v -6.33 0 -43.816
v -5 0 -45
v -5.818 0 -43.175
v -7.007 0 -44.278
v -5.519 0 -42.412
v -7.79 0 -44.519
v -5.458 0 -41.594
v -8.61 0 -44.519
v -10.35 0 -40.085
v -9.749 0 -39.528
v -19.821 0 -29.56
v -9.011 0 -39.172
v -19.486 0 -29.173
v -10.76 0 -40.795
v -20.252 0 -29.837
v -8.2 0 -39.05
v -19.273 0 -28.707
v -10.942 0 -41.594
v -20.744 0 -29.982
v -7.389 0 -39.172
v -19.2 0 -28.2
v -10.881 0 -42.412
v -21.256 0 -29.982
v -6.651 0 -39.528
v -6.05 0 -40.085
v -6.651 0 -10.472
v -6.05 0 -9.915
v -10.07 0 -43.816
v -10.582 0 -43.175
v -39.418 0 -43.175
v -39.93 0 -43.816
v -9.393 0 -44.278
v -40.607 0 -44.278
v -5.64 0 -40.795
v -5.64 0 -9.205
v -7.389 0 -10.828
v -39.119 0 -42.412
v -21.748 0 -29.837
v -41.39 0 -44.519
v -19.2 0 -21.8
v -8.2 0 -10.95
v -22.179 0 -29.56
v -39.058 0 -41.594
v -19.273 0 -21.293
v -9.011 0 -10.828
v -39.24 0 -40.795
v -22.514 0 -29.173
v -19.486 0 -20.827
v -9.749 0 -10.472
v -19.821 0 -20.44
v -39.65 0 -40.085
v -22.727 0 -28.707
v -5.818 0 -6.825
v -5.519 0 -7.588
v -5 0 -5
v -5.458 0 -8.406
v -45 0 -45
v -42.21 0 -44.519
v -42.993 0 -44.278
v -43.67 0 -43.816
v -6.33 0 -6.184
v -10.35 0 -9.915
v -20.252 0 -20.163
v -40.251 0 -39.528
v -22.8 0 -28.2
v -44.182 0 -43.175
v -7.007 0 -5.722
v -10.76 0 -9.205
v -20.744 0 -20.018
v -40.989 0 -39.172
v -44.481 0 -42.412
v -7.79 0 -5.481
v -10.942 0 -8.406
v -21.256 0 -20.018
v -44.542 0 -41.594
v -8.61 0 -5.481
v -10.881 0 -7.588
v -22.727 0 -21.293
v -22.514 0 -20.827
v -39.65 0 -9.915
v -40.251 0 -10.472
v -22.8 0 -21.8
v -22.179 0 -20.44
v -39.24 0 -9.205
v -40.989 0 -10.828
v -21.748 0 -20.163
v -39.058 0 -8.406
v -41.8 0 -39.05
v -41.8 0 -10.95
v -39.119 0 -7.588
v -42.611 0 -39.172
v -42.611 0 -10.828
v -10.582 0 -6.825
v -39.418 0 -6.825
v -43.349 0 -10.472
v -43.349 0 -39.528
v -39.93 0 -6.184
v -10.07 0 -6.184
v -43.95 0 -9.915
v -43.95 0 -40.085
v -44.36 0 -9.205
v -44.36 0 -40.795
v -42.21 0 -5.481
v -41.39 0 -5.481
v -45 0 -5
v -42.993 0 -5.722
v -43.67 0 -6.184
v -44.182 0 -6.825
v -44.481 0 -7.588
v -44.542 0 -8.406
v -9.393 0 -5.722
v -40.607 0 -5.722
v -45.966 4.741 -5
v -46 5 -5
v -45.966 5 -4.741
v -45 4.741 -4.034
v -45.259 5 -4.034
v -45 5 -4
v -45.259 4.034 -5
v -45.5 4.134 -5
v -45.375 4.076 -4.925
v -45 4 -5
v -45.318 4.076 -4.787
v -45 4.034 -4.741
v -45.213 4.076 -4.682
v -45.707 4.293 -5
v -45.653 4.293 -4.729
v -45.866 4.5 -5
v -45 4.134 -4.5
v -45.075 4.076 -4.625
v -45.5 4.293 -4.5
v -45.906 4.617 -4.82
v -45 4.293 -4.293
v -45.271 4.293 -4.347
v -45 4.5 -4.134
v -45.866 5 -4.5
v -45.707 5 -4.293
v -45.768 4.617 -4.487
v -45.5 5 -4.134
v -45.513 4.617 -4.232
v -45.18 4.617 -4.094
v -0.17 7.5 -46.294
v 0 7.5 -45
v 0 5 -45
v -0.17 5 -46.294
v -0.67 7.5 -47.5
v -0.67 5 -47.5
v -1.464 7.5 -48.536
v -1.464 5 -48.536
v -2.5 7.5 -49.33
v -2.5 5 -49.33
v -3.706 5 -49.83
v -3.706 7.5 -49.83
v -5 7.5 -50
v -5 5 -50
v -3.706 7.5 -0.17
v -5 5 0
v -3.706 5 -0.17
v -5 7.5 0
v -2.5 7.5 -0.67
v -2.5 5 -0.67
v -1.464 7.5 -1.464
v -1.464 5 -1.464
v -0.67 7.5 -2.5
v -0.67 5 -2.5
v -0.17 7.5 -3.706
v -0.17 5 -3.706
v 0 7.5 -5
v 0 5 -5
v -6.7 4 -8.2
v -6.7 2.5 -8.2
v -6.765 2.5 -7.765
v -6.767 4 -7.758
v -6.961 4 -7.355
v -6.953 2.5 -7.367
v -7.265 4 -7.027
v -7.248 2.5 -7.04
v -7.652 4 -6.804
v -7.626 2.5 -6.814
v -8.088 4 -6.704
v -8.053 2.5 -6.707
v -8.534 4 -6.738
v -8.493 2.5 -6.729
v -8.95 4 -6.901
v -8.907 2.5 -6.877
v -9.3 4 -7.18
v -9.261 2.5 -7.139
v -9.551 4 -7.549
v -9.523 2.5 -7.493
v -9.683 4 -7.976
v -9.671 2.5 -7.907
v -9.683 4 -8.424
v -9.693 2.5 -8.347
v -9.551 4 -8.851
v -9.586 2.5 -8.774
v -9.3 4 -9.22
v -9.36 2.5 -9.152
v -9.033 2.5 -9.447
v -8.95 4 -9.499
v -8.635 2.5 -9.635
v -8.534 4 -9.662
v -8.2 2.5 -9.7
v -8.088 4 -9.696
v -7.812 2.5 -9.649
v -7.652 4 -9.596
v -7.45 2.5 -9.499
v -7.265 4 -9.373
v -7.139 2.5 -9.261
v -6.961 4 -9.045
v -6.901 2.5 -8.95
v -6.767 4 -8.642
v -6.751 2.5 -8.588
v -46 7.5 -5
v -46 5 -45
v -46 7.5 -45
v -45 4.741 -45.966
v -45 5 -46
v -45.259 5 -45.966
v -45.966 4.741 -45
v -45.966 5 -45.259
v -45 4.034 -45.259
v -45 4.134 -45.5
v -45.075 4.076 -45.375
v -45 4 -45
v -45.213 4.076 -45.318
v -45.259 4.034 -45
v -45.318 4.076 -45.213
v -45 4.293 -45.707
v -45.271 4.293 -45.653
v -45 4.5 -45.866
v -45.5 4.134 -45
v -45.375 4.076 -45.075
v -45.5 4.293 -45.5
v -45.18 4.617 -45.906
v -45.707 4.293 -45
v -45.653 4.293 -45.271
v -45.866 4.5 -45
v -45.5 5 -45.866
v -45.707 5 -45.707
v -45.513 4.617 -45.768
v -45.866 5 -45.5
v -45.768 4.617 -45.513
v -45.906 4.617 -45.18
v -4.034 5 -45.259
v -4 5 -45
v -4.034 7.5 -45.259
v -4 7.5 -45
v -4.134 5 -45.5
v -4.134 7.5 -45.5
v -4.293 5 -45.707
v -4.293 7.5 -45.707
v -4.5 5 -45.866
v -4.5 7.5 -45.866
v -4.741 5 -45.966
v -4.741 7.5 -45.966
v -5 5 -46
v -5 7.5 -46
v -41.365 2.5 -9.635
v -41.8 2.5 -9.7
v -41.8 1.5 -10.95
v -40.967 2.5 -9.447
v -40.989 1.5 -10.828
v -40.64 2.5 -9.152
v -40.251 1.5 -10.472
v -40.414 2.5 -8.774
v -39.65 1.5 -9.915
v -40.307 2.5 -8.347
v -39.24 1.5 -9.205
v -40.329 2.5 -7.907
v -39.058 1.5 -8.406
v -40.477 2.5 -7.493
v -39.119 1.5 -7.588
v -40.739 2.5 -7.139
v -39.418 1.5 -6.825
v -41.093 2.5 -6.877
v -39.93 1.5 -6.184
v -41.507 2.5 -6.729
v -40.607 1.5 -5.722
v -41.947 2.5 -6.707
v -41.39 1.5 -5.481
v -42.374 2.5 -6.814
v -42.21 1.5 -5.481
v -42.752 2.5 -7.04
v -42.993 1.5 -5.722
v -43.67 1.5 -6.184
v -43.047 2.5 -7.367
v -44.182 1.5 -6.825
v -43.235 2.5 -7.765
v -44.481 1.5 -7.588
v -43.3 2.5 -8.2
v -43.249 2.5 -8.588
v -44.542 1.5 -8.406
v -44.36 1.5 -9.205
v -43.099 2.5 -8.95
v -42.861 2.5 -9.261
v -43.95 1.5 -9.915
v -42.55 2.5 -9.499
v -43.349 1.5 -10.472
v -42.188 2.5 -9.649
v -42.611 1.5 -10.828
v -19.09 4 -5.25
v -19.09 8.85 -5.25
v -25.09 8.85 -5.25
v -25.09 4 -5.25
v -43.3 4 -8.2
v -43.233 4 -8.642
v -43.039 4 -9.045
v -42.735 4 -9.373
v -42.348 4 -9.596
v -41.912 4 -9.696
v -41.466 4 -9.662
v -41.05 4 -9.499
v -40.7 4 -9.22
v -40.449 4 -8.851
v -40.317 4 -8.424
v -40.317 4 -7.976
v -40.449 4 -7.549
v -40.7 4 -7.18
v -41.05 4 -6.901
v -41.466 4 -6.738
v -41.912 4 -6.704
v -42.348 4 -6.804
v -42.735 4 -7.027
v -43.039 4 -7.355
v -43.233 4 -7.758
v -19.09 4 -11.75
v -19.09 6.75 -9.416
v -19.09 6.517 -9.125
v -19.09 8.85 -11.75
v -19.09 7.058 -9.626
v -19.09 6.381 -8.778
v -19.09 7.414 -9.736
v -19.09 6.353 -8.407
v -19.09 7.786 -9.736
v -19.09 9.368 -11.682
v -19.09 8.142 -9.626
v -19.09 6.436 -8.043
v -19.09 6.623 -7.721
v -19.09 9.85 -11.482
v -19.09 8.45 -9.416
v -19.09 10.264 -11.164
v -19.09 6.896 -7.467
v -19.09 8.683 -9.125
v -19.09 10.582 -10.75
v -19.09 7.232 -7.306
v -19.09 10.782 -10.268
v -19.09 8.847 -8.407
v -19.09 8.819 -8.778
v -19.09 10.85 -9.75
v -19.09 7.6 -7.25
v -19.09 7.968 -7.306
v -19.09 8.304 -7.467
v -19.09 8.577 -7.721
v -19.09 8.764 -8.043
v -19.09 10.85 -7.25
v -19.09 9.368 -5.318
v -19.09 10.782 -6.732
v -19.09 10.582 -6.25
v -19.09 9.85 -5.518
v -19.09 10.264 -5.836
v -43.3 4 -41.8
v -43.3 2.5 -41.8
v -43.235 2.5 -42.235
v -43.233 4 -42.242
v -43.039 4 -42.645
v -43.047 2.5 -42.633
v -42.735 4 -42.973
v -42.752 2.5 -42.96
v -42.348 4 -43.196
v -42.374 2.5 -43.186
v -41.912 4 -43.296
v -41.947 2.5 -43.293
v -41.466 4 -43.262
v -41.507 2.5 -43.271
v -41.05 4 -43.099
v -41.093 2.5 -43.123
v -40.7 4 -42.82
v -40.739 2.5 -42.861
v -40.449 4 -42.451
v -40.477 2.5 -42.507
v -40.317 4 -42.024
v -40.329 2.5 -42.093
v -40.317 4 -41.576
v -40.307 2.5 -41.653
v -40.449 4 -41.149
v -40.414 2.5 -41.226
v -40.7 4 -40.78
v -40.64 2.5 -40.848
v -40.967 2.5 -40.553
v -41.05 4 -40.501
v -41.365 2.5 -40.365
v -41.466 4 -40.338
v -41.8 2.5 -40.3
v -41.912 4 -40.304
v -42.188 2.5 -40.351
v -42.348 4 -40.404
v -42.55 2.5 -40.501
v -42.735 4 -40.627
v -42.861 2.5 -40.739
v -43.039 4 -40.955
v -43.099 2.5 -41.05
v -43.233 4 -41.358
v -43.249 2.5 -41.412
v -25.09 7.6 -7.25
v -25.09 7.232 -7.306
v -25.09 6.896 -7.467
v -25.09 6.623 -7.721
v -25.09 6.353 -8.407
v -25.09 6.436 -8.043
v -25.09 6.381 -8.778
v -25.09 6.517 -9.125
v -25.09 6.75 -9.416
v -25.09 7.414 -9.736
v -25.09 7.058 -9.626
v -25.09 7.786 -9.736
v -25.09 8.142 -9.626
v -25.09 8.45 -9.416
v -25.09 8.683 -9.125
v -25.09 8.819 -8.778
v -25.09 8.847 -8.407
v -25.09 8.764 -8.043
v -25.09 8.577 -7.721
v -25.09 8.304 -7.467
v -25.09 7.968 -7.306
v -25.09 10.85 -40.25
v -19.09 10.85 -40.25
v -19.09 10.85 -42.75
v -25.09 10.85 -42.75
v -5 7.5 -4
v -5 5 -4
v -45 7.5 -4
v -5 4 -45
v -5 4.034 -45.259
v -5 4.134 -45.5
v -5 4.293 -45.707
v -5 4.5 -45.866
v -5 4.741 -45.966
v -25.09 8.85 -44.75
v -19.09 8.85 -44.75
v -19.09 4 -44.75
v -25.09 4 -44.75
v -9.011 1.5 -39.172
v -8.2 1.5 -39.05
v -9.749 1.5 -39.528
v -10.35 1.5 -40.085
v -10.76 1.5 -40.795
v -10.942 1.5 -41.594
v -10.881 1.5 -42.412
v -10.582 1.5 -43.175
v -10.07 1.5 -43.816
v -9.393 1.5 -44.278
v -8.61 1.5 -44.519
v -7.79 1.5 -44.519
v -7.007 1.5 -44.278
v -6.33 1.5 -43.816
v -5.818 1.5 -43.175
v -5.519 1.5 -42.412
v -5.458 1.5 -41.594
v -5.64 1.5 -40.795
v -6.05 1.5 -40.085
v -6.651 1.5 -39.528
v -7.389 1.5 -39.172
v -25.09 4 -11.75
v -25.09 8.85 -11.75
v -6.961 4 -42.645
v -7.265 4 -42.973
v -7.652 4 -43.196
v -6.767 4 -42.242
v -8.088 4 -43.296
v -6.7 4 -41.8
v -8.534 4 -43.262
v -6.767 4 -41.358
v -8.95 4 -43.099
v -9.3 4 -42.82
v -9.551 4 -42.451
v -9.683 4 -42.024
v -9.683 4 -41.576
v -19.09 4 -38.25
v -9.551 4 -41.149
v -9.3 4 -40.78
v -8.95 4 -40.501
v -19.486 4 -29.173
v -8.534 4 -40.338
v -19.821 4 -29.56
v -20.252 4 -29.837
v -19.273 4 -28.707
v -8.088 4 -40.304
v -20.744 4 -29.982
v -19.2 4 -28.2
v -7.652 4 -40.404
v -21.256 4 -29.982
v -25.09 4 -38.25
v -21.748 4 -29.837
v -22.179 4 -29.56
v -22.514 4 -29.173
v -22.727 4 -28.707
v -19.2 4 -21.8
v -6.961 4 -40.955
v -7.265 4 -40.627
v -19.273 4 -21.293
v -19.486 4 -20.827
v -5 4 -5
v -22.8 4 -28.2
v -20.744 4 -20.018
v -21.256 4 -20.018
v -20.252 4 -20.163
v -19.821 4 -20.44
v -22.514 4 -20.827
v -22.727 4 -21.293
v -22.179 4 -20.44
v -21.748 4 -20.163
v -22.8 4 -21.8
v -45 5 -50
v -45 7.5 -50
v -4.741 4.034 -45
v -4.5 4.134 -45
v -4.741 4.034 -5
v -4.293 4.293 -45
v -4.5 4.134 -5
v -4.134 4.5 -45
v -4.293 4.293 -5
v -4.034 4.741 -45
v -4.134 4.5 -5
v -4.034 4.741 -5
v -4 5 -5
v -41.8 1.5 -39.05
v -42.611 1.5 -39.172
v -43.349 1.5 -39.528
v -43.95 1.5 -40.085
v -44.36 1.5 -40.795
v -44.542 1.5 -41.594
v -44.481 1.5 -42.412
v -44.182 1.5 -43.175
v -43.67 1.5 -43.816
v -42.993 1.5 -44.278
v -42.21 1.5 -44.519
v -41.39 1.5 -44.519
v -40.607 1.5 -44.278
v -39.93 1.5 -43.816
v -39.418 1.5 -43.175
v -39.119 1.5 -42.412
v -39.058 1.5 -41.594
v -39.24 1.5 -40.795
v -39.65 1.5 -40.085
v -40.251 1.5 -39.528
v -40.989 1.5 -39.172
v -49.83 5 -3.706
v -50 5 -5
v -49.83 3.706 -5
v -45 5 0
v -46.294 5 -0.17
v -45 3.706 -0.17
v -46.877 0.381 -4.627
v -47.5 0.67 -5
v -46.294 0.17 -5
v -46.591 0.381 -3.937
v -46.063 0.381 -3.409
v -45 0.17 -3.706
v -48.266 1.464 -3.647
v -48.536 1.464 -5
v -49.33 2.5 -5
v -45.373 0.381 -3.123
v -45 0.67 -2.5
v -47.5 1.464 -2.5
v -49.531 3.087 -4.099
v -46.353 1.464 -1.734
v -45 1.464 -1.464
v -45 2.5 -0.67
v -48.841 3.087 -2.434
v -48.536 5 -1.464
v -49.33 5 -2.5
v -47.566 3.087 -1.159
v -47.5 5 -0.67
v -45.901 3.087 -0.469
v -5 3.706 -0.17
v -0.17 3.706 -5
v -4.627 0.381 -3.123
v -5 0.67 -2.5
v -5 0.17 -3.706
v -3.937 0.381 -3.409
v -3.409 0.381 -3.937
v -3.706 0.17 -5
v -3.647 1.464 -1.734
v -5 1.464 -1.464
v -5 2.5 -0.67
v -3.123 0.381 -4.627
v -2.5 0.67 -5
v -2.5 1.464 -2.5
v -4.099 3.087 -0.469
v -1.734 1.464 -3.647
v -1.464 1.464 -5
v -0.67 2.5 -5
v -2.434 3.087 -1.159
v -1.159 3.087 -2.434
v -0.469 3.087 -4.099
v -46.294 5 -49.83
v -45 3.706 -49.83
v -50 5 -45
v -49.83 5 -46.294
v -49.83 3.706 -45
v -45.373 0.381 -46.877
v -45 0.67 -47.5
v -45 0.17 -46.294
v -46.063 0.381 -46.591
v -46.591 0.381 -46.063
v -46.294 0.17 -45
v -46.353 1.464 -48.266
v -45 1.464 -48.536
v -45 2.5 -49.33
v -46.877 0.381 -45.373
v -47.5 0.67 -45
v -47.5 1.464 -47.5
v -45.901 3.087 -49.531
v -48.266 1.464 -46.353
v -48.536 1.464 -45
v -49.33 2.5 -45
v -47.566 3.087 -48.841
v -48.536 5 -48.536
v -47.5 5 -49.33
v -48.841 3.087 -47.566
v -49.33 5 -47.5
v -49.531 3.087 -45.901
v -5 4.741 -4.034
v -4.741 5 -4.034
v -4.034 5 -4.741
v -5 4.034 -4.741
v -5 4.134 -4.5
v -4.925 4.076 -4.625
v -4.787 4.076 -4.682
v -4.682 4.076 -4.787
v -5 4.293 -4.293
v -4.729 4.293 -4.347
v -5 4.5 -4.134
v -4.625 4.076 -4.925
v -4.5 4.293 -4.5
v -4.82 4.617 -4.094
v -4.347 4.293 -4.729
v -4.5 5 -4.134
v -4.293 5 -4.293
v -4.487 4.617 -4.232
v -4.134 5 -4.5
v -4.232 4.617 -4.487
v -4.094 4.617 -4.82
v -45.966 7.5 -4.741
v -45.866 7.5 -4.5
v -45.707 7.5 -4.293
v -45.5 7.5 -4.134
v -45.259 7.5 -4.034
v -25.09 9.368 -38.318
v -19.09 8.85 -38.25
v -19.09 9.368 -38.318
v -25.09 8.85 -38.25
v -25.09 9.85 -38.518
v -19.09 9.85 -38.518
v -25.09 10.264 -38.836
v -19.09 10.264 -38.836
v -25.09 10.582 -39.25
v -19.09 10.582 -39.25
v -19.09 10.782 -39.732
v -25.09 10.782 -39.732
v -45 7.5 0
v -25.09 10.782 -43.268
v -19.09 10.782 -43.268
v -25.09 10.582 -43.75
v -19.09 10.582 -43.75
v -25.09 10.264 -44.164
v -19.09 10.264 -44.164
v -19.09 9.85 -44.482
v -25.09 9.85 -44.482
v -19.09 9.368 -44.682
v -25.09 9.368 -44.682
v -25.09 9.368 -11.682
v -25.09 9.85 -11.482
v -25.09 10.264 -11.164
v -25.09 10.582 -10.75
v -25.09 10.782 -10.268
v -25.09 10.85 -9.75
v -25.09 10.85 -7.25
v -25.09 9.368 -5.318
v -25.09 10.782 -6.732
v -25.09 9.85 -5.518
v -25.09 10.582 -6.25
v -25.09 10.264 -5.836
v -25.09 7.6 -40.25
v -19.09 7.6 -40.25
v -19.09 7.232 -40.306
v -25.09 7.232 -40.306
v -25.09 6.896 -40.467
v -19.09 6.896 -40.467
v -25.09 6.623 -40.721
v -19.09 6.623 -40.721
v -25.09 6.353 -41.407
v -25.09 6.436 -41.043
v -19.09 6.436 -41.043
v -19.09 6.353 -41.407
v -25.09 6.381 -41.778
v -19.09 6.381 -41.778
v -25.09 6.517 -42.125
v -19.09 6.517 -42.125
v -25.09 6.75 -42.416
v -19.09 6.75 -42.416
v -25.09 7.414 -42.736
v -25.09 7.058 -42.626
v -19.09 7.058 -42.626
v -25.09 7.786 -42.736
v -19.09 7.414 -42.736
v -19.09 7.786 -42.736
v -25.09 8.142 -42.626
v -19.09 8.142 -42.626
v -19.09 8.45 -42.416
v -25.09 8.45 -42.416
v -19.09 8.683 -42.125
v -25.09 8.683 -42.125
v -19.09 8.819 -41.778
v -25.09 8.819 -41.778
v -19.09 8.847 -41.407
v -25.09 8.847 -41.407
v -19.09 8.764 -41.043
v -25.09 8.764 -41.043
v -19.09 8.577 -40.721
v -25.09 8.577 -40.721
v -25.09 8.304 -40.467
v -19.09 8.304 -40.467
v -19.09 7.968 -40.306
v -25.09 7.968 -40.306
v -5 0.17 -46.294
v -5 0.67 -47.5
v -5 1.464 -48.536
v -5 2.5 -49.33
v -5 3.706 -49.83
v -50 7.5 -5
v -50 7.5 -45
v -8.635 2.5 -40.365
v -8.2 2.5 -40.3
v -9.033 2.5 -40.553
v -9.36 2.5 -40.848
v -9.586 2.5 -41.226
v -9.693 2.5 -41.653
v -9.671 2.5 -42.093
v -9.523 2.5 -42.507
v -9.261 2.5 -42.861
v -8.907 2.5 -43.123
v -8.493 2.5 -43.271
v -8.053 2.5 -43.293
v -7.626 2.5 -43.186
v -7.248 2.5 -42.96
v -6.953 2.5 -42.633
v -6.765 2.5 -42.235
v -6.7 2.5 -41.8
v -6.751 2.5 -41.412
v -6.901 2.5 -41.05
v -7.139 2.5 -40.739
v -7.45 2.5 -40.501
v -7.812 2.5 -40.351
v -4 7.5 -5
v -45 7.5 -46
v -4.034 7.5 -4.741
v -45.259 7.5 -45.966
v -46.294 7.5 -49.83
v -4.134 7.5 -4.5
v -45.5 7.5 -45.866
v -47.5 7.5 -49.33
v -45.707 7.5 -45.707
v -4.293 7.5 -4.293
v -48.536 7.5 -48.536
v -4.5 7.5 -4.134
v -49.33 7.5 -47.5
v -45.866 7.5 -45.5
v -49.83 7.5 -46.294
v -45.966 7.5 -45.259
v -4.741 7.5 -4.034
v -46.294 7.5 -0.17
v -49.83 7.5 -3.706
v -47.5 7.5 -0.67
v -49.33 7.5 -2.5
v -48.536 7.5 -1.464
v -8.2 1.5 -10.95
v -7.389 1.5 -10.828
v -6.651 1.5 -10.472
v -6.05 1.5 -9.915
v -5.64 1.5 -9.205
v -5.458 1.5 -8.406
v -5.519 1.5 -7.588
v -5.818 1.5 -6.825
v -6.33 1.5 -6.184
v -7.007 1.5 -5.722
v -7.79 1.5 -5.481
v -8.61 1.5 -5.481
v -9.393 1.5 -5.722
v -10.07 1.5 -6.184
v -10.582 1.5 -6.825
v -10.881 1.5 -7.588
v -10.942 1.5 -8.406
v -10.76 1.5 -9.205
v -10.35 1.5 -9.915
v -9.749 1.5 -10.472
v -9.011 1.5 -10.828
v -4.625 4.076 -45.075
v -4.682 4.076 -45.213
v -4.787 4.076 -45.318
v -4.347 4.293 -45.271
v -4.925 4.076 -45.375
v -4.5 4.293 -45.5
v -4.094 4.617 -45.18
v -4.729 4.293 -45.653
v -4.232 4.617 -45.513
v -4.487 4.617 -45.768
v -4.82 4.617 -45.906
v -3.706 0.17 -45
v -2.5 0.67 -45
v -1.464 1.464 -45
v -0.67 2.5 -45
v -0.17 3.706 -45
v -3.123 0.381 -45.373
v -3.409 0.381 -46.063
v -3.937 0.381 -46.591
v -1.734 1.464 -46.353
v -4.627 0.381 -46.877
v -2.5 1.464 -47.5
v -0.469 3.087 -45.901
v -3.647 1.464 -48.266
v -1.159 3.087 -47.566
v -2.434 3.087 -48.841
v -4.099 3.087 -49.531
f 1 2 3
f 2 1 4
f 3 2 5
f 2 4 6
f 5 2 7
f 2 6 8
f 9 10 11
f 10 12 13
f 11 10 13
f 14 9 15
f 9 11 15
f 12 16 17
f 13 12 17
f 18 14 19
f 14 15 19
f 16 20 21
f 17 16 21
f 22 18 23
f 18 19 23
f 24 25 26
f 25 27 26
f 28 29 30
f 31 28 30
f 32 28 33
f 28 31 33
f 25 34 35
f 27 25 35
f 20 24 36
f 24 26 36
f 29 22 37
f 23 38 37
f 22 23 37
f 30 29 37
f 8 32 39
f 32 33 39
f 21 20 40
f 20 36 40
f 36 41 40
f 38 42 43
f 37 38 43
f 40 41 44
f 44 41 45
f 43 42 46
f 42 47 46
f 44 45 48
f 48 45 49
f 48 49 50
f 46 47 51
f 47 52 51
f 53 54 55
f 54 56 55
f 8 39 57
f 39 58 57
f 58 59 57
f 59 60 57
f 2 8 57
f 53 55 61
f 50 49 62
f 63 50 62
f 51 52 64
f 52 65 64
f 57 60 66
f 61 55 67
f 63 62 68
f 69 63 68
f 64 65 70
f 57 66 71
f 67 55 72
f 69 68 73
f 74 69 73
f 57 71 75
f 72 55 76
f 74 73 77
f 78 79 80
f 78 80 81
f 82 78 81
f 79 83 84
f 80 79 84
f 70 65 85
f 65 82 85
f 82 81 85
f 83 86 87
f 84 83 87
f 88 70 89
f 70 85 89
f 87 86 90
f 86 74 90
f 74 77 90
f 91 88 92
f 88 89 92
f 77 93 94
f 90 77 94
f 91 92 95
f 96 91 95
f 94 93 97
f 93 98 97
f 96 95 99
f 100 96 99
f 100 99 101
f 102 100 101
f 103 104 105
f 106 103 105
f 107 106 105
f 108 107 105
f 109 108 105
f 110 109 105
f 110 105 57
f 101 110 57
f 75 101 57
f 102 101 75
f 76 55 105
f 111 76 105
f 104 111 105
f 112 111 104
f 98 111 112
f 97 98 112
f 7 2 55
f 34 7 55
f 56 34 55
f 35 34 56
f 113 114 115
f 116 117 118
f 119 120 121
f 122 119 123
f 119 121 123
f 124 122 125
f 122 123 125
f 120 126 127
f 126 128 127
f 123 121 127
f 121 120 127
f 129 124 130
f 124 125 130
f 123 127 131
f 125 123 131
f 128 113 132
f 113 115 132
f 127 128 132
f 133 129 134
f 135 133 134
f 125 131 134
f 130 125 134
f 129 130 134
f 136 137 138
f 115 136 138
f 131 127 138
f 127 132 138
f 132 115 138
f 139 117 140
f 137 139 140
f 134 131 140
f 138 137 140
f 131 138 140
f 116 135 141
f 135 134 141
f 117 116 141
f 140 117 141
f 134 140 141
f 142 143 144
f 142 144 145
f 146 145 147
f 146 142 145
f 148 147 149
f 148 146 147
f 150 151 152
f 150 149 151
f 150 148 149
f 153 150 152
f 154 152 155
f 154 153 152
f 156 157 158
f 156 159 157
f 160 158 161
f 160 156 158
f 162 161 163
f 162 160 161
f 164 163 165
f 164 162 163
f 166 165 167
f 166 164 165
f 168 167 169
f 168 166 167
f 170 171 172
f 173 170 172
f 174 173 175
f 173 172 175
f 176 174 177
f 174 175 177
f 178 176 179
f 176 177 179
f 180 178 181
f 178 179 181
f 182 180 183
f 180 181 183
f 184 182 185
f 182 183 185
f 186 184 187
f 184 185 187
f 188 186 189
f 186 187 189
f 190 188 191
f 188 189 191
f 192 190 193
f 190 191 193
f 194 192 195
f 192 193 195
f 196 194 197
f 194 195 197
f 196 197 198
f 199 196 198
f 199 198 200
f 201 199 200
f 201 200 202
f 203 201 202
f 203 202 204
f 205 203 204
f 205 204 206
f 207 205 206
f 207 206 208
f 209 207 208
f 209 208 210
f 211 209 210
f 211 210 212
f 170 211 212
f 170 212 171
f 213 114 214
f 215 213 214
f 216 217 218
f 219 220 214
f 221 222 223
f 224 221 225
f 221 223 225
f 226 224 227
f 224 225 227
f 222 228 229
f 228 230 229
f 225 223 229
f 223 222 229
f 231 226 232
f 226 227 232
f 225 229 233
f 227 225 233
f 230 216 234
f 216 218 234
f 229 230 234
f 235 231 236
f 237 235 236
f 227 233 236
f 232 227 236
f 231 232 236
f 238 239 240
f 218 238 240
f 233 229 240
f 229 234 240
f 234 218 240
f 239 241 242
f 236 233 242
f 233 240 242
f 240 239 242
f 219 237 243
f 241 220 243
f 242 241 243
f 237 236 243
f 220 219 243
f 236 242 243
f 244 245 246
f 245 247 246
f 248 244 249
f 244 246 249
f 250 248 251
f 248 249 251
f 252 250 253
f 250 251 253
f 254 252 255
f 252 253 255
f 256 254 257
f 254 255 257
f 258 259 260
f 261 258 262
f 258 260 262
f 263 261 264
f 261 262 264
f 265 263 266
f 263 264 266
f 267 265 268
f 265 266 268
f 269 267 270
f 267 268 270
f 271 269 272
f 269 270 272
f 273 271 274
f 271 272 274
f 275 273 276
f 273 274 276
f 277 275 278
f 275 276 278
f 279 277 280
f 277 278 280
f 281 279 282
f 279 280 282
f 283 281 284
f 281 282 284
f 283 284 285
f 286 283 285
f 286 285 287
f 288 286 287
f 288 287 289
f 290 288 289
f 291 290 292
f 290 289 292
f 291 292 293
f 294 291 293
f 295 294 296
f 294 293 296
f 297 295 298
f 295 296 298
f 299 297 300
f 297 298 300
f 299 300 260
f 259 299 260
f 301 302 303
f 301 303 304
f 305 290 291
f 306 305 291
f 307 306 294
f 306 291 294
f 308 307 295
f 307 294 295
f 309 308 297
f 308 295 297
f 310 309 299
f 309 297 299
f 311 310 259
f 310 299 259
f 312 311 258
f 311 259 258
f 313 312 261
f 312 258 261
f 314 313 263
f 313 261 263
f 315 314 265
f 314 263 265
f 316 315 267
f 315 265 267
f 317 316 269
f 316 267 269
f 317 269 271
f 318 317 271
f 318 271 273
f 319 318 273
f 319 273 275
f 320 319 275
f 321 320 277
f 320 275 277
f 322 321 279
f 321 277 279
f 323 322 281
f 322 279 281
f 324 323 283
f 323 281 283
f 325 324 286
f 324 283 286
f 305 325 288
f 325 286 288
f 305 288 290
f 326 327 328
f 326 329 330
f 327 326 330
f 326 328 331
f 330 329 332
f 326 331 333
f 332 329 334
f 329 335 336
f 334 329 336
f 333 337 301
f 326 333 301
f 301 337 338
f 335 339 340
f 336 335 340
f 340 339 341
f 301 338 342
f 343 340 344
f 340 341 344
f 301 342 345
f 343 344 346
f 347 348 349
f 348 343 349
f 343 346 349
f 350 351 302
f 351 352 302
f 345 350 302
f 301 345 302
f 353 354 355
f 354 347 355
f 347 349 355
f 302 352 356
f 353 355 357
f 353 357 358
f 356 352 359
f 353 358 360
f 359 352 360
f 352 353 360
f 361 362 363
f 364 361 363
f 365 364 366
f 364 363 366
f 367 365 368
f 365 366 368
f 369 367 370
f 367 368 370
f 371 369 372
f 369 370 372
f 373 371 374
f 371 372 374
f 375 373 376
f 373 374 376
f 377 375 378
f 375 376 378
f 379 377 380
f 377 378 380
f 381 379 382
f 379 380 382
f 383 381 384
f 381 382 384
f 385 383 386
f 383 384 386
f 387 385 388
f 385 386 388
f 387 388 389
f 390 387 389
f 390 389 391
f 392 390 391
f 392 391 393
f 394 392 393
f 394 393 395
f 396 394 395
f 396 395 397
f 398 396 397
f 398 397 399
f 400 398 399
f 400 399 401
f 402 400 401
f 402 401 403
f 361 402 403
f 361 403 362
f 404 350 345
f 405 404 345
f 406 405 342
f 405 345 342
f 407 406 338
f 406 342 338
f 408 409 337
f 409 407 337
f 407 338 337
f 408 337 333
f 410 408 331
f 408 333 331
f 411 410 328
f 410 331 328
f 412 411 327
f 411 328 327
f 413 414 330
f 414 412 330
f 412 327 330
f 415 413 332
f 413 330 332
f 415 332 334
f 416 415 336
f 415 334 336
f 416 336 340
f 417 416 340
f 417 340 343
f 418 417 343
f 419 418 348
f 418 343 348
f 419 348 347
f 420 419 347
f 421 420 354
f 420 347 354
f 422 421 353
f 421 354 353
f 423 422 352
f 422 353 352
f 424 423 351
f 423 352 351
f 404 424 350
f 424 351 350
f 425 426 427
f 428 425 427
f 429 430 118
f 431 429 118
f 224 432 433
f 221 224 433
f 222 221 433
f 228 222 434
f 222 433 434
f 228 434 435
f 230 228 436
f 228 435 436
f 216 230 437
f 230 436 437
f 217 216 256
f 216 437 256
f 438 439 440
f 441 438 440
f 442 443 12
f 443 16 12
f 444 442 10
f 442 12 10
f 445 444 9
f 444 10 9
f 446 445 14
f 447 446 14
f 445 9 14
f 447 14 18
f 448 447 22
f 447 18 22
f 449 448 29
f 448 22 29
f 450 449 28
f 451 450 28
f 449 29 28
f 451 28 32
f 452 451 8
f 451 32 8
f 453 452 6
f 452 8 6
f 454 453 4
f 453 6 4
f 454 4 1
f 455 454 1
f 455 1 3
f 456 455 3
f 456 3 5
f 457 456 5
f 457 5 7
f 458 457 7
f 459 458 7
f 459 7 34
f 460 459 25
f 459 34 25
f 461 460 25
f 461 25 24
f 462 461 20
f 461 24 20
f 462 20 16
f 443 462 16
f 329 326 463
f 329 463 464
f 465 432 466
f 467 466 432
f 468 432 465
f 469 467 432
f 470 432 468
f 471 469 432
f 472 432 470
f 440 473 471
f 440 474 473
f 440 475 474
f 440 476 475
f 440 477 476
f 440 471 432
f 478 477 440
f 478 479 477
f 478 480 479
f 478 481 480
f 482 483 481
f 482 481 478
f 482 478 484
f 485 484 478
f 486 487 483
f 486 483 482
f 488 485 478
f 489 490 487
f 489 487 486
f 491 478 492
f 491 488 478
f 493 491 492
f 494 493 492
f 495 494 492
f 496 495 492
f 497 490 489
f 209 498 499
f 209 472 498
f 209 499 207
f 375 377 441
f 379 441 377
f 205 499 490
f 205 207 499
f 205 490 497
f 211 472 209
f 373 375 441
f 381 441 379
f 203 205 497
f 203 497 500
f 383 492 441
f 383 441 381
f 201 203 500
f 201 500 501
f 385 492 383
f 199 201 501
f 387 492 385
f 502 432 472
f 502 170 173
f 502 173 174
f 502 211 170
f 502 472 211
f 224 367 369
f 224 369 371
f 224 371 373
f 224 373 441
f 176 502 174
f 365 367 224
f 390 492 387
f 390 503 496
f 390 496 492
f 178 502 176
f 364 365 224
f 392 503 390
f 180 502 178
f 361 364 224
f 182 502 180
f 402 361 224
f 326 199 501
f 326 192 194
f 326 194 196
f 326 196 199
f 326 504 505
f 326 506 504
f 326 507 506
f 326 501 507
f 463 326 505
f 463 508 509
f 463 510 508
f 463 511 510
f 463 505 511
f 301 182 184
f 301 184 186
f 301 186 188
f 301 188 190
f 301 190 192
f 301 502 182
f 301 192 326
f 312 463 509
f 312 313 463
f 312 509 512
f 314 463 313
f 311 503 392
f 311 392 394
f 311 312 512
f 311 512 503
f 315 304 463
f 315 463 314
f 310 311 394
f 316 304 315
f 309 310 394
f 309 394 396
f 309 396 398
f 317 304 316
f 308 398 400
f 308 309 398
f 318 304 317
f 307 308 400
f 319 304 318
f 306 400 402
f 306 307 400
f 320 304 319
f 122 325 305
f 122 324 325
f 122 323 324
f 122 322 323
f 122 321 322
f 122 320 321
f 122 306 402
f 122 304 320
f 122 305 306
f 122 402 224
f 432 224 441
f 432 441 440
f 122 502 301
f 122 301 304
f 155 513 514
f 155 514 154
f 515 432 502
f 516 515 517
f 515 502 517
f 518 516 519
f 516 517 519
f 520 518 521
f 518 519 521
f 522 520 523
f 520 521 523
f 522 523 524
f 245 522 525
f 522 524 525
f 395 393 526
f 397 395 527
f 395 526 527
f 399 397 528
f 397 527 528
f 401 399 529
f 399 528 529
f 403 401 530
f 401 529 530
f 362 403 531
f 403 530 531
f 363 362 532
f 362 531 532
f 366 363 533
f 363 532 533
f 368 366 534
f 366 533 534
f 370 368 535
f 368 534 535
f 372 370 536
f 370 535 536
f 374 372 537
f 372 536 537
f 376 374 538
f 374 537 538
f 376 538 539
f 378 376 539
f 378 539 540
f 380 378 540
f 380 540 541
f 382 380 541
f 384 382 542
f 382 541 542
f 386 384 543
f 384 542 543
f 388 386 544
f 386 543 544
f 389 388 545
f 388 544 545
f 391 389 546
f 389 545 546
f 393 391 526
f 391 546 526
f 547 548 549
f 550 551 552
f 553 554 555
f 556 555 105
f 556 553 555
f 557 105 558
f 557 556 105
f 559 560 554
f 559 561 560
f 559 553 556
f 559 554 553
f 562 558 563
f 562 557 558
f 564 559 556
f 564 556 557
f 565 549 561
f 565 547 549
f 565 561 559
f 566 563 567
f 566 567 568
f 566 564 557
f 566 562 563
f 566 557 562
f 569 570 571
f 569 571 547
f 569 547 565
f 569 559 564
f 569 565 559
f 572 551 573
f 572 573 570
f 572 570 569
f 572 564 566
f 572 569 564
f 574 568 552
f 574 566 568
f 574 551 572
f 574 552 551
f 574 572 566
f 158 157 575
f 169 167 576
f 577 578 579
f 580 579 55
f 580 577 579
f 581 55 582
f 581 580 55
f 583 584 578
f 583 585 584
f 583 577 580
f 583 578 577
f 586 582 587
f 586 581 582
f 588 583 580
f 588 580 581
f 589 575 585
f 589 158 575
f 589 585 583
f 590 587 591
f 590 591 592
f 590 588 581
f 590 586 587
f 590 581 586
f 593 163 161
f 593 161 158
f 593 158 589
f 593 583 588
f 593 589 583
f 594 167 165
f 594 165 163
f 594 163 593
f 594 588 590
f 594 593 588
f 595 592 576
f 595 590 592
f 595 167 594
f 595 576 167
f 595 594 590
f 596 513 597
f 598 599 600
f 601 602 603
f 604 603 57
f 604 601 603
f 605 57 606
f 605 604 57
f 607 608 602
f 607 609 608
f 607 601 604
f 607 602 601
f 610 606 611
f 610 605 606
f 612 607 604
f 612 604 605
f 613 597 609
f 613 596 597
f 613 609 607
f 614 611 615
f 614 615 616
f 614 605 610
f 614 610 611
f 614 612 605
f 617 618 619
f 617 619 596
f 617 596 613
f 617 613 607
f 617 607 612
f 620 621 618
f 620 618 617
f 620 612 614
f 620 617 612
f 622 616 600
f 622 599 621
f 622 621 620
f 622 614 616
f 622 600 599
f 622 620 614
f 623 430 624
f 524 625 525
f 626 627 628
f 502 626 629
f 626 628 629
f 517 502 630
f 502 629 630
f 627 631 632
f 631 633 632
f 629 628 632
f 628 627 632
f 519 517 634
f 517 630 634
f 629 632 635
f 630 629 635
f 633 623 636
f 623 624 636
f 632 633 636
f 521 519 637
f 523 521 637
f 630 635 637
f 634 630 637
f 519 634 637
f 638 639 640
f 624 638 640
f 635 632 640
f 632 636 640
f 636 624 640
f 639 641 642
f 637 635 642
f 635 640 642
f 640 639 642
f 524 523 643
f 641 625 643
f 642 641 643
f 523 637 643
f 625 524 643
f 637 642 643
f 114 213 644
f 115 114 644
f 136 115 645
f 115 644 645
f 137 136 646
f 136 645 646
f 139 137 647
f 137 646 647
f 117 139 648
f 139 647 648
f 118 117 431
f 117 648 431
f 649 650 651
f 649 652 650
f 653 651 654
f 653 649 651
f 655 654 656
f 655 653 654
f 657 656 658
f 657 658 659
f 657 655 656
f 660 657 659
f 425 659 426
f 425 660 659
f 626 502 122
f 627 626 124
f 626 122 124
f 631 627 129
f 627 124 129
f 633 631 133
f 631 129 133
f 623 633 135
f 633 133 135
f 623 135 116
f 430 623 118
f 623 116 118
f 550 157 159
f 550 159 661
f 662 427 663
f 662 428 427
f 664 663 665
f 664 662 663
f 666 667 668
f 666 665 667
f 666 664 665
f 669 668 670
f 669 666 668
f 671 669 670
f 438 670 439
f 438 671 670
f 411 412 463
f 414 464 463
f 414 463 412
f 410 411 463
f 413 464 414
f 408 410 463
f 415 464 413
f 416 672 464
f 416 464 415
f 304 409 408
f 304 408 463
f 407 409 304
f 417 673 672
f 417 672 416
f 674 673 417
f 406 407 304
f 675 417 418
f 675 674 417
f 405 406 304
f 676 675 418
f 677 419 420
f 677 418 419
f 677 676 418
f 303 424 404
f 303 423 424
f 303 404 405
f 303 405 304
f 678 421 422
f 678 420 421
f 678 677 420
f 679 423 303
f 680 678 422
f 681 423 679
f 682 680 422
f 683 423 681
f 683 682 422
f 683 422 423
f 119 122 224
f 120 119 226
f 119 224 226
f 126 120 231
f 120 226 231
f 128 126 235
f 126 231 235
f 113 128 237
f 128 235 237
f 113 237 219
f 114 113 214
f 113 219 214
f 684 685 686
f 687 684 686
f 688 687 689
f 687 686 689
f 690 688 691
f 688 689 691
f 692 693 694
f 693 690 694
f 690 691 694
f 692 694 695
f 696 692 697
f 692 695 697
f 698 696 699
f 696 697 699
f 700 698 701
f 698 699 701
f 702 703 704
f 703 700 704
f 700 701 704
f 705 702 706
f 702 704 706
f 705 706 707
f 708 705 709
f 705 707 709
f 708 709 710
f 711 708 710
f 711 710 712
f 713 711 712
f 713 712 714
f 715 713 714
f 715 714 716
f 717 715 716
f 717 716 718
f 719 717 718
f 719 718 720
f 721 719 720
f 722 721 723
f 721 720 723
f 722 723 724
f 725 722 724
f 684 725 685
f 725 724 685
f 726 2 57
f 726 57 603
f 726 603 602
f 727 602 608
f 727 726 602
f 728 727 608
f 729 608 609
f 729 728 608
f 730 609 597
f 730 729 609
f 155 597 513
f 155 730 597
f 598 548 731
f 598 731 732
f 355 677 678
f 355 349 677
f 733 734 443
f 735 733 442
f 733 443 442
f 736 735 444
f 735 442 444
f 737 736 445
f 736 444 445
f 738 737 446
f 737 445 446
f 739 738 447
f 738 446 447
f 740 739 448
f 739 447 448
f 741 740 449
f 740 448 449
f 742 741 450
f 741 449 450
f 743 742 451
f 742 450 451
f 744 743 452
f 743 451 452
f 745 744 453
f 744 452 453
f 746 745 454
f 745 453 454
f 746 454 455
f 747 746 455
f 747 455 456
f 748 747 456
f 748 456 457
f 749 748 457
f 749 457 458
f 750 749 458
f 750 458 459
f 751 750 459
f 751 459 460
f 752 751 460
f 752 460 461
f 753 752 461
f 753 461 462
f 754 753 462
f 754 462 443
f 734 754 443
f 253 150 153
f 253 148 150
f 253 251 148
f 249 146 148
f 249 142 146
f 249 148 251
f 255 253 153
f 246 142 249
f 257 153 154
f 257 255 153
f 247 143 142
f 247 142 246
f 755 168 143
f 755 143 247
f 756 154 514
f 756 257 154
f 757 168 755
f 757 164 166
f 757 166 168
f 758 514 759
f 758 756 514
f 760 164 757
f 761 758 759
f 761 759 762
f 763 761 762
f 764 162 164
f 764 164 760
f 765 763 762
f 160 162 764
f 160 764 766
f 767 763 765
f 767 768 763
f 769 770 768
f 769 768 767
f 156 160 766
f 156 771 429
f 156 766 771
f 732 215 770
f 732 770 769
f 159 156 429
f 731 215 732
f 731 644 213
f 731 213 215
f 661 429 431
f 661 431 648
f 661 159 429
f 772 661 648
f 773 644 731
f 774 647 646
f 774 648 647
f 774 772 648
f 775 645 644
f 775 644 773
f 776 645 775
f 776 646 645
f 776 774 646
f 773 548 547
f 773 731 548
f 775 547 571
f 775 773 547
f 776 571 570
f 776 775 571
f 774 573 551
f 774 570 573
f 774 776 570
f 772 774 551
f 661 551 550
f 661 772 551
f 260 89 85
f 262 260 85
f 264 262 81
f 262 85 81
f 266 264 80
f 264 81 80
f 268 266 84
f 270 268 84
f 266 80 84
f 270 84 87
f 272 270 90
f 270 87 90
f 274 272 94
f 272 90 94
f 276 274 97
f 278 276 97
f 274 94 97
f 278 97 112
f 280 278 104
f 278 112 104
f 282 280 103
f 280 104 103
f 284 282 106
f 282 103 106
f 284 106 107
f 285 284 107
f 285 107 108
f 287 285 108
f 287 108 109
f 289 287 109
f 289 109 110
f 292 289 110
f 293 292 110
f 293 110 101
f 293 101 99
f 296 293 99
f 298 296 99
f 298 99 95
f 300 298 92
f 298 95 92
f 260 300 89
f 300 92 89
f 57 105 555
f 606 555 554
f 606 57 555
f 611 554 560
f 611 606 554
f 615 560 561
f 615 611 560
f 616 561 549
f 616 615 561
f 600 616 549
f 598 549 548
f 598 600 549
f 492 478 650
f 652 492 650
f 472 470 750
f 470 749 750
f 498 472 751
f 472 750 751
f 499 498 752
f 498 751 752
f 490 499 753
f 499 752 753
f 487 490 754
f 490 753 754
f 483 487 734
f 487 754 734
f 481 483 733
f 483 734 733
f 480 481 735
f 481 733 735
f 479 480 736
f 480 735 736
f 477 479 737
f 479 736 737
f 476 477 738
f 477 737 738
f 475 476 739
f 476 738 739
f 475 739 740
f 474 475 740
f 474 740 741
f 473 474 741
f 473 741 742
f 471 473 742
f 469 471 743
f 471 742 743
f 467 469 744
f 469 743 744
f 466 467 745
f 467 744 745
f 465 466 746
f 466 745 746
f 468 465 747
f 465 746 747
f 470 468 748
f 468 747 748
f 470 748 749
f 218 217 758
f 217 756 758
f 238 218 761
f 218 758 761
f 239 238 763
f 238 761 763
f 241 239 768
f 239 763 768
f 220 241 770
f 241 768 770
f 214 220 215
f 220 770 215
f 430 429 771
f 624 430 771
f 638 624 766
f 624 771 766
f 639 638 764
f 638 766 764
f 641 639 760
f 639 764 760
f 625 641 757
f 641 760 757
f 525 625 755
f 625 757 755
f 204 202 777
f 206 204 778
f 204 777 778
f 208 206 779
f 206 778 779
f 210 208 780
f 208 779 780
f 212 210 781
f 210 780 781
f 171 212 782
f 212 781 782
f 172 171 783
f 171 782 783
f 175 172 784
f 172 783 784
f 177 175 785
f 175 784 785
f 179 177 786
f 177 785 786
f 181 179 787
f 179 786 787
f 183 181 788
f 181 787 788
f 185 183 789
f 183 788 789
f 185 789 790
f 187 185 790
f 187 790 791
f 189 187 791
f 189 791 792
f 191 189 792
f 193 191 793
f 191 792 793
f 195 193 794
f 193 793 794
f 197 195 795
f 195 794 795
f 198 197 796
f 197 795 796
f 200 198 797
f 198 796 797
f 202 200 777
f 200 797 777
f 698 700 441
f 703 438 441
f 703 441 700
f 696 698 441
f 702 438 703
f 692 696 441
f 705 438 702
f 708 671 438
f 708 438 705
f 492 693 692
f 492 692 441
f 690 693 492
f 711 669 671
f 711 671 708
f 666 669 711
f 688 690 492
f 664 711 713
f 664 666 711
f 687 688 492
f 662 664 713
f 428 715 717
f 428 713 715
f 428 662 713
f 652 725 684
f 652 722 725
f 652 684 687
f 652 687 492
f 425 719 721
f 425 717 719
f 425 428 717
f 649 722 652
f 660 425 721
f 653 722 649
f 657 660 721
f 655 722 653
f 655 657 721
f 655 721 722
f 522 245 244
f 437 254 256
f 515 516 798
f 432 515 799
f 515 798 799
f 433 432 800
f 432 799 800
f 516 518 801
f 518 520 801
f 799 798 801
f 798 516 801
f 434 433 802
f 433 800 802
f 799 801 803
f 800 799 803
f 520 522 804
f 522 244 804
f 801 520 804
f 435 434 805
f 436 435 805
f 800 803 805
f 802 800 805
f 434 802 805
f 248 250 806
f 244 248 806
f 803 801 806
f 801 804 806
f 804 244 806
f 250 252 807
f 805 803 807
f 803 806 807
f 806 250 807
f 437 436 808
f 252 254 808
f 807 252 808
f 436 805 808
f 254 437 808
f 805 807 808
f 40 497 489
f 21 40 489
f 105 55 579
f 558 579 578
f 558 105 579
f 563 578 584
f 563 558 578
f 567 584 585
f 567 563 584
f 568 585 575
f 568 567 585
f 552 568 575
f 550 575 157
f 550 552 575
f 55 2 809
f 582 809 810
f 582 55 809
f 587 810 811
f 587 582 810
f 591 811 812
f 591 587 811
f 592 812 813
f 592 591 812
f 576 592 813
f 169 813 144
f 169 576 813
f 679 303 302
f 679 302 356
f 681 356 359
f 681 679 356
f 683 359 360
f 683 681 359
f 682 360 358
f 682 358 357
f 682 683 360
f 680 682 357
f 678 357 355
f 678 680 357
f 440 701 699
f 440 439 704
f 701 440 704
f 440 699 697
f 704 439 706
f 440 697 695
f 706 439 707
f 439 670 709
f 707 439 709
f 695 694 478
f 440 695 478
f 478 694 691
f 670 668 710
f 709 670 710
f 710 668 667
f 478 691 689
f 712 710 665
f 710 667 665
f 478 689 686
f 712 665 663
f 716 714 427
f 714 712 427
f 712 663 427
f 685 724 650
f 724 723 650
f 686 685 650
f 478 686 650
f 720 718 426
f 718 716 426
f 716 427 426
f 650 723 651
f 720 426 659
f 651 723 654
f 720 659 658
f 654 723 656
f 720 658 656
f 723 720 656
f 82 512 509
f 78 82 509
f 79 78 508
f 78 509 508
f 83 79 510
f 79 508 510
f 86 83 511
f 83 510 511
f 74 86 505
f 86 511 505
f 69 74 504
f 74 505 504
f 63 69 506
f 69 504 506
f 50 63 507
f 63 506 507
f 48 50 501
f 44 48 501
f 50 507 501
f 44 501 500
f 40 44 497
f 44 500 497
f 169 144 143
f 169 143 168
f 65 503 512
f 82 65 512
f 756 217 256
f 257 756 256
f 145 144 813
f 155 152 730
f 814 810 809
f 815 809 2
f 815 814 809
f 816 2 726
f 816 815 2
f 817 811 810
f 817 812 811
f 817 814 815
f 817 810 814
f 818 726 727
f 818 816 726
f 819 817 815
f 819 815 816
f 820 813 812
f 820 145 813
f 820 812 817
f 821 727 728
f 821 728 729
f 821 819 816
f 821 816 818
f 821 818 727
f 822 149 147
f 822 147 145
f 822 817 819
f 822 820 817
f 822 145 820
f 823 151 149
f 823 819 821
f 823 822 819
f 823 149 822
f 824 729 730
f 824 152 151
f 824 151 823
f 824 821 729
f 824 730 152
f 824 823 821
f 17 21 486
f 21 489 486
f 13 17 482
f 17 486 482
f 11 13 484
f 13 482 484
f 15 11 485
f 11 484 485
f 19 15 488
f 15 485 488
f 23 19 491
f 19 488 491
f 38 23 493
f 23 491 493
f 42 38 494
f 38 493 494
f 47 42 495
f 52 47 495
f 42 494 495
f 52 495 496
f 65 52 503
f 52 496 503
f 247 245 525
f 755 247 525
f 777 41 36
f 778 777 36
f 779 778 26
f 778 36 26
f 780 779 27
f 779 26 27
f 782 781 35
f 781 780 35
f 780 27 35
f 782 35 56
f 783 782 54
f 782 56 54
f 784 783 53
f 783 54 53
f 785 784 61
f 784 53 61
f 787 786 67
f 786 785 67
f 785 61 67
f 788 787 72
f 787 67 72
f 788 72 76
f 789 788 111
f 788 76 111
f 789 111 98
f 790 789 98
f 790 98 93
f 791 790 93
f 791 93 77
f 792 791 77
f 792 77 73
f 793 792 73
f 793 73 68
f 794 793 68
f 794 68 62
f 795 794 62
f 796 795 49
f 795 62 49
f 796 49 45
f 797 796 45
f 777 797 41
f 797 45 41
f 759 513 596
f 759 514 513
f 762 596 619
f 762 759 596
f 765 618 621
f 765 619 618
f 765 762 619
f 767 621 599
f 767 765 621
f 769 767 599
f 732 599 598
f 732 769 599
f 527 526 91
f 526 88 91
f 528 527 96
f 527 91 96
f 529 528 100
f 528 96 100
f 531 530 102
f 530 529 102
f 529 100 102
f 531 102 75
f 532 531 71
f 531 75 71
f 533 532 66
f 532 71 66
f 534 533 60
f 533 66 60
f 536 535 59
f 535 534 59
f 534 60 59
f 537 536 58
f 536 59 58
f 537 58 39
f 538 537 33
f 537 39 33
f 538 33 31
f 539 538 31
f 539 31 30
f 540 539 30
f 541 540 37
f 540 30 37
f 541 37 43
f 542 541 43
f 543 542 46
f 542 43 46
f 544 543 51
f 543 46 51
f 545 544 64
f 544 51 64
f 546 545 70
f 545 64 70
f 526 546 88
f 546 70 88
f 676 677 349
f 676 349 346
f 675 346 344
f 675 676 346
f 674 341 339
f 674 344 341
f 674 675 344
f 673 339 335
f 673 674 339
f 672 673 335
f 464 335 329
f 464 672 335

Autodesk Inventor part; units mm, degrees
ref_plane "YZ Plane" through (0, 0, 0) normal (1, 0, 0) x (0, 1, 0)
ref_plane "XZ Plane" through (0, 0, 0) normal (0, 1, 0) x (-1, 0, 0)
ref_plane "XY Plane" through (0, 0, 0) normal (0, 0, 1) x (1, 0, 0)
sketch "Sketch1" plane through (0, 0, 0) normal (0, 1, 0) x (-1, 0, 0)
  line L0 (0, 0) -> (50, 0)
  line L1 (50, 0) -> (50, -50)
  line L2 (50, -50) -> (0, -50)
  line L3 (0, -50) -> (0, 0)
  dimension "d0" = 50
  dimension "d1" = 50
extrude "Extrusion1" add sketch "Sketch1" along normal blind 7.5
fillet "Fillet1" radius 5 4 edges at (-50, 3.75, 0) (-50, 3.75, -50) (0, 3.75, -50) (0, 3.75, 0)
ref_plane "Work Plane2" through (-25, 7.5, -50) normal (-1, 0, 0) x (0, -1, 0)
ref_plane "Work Plane1" through (0, 7.5, -25) normal (0, 0, -1) x (-1, 0, 0)
fillet "Fillet2" radius 5 8 edges at (-1.4645, 0, -48.5355) (-25, 0, -50) (-48.5355, 0, -48.5355) (-50, 0, -25) (-48.5355, 0, -1.4645) (-25, 0, 0) (-1.4645, 0, -1.4645) (0, 0, -25)
shell "Shell1" thickness 4 removed faces 1 at (-16.6667, 7.5, -18.3333)
sketch "Sketch2" plane through (0, 0, 0) normal (0, -1, 0) x (1, 0, 0)
  line L0 (-25, -60) -> (-25, 10) projected
  line L1 (10, -25) -> (-60, -25) projected
  line L2 (-8.2, -8.2) -> (-41.8, -8.2) construction
  line L3 (-41.8, -8.2) -> (-41.8, -41.8) construction
  line L4 (-41.8, -41.8) -> (-8.2, -41.8) construction
  line L5 (-8.2, -41.8) -> (-8.2, -8.2) construction
  circle A0 centre (-8.2, -8.2) radius 1.5
  point P0 (0, 0)
  point P1 (-5, -45)
  point P2 (-45, -45)
  point P3 (-25, -41.8)
  point P4 (-8.2, -25)
  point P5 (-8.2, -25)
  point P6 (-25, -41.8)
  dimension "d8" = 33.6
  dimension "d9" = 33.6
  dimension "d10" = 3
extrude "Extrusion2" cut sketch "Sketch2" against normal up to surface (4 mm away)
ref_plane "Work Plane3" through (-8.2, 0, -8.2) normal (-1, 0, 0) x (0, -1, 0)
sketch "Sketch3" plane through (-8.2, 0, -8.2) normal (-1, 0, 0) x (0, -1, 0)
  line L0 (-4, -1.5) -> (-4, 1.5) projected
  line L1 (0, 1.5) -> (0, -1.5) projected
  line L2 (0, -36.8) -> (0, 3.2) projected
  line L3 (0, 2.75) -> (-1.5, 2.75)
  line L4 (-1.5, 2.75) -> (-1.5, -2.75)
  line L5 (-1.5, -2.75) -> (0, -2.75)
  line L6 (0, -2.75) -> (0, 2.75)
  line L7 (-1.5, -2.75) -> (-2.5, -1.5)
  line L8 (0, -1.5) -> (-4, -1.5) projected
  line L9 (0, 0) -> (-4, 0)
  point P0 (0, 8.2)
  point P1 (0, -2.75)
  dimension "d13" = 5.5
  dimension "d14" = 1.5
  dimension "d15" = 1
revolve "Revolution1" cut sketch "Sketch3" angle 360 about axis through (-8.2, 0, -8.2) along (0, 1, 0) contours L8 L4 L7 | L4 L8 L2 L5
mirror "Mirror1" about plane through (0, 7.5, -25) normal (0, 0, -1) of "Extrusion2", "Revolution1"
mirror "Mirror2" about plane through (-25, 7.5, -50) normal (-1, 0, 0) of "Extrusion2", "Mirror1", "Revolution1"
sketch "Sketch4" plane through (-45, 4, -45) normal (0, 1, 0) x (1, 0, 0)
  line L0 (20, -55) -> (20, 15) construction
  line L1 (-15, -20) -> (55, -20) construction
  line L2 (24, -23.2) -> (24, -16.8) construction
  line L3 (25.8, -23.2) -> (25.8, -16.8)
  line L4 (22.2, -16.8) -> (22.2, -23.2)
  arc A0 (22.2, -23.2) -> (25.8, -23.2) centre (24, -23.2) ccw
  arc A1 (25.8, -16.8) -> (22.2, -16.8) centre (24, -16.8) ccw
  point P0 (45, -45)
  point P1 (24, -20)
  point P2 (24, -15)
  point P3 (24, -25)
  dimension "d17" = 3.6
  dimension "d38" = 6.4
  dimension "d39" = 4
extrude "Extrusion3" cut sketch "Sketch4" against normal up to surface (4 mm away)
ref_plane "Płaszczyzna konstrukcyjna9" through (-19.09, 4, -28.2) normal (-1, 0, 0) x (0, 0, 1)
sketch "Szkic6" plane through (-19.09, 4, -28.2) normal (-1, 0, 0) x (0, 0, 1)
  line L0 (0, 0) -> (0, 0) projected
  line L1 (0, 0) -> (6.4, 0) projected
  line L2 (6.4, 0) -> (6.4, 0) projected
  line L3 (6.4, 0) -> (0, 0) projected
  line L4 (-15.1, 0) -> (-12.1, 0) projected
  line L5 (18.5, 0) -> (21.5, 0) projected
  line L6 (-15.1, 0) -> (-12.1, 0) projected
  line L7 (18.5, 0) -> (21.5, 0) projected
  line L8 (23.2, 0) -> (-16.8, 0) projected
  line L9 (-16.8, 0) -> (23.2, 0) projected
  line L10 (6.4, -4) -> (6.4, -4) projected
  line L11 (6.4, 0) -> (6.4, -4) projected
  line L12 (6.4, 0) -> (6.4, 0) projected
  line L13 (6.4, 0) -> (6.4, -4) projected
  line L14 (0, -4) -> (0, -4) projected
  line L15 (0, 0) -> (0, -4) projected
  line L16 (0, 0) -> (0, 0) projected
  line L17 (0, 0) -> (0, -4) projected
  line L18 (-16.55, 0) -> (-10.05, 0)
  line L19 (-10.05, 0) -> (-10.05, 6.85)
  line L20 (-10.05, 6.85) -> (-16.55, 6.85)
  line L21 (-16.55, 6.85) -> (-16.55, 0)
  circle A0 centre (-13.3, 3.6) radius 1.25
  line L22 (-13.3, 0) -> (-13.3, 6.85) construction
  line L23 (3.2, -6.17) -> (3.2, 9.02) construction
  line L24 (22.95, 0) -> (16.45, 0)
  line L25 (16.45, 0) -> (16.45, 6.85)
  line L26 (16.45, 6.85) -> (22.95, 6.85)
  line L27 (22.95, 6.85) -> (22.95, 0)
  circle A1 centre (19.7, 3.6) radius 1.25
  line L28 (19.7, 0) -> (19.7, 6.85) construction
  point P0 (28.2, -4)
  point P1 (16.45, 0)
  point P2 (18.5, 0)
  point P3 (21.5, 0)
  point P4 (-16.55, 0)
  point P5 (-15.1, 0)
  point P6 (-12.1, 0)
  point P7 (-10.05, 0)
  dimension "d30" = 2
  dimension "d31" = 2
  dimension "d33" = 3.6
  dimension "d34" = 2.5
  dimension "d35" = 33
extrude "Wyciągnięcie proste5" add sketch "Szkic6" along normal blind 6
fillet "Zaokrąglenie3" radius 2 4 edges at (-22.09, 10.85, -38.25) (-22.09, 10.85, -44.75) (-22.09, 10.85, -11.75) (-22.09, 10.85, -5.25)
equation "\"d0\" = blob_overall"
equation "\"d1\" = blob_overall"
equation "\"d4\" = corner_round"
equation "\"d5\" = corner_round"
equation "\"d6\" = shell_width"
equation "\"d31\" = d30"
equation "\"blob_overall\" = 50"
equation "\"corner_round\" = 5"
equation "\"matrix_size\" = 32"
equation "\"shell_width\" = 4"
properties part number "case2"
